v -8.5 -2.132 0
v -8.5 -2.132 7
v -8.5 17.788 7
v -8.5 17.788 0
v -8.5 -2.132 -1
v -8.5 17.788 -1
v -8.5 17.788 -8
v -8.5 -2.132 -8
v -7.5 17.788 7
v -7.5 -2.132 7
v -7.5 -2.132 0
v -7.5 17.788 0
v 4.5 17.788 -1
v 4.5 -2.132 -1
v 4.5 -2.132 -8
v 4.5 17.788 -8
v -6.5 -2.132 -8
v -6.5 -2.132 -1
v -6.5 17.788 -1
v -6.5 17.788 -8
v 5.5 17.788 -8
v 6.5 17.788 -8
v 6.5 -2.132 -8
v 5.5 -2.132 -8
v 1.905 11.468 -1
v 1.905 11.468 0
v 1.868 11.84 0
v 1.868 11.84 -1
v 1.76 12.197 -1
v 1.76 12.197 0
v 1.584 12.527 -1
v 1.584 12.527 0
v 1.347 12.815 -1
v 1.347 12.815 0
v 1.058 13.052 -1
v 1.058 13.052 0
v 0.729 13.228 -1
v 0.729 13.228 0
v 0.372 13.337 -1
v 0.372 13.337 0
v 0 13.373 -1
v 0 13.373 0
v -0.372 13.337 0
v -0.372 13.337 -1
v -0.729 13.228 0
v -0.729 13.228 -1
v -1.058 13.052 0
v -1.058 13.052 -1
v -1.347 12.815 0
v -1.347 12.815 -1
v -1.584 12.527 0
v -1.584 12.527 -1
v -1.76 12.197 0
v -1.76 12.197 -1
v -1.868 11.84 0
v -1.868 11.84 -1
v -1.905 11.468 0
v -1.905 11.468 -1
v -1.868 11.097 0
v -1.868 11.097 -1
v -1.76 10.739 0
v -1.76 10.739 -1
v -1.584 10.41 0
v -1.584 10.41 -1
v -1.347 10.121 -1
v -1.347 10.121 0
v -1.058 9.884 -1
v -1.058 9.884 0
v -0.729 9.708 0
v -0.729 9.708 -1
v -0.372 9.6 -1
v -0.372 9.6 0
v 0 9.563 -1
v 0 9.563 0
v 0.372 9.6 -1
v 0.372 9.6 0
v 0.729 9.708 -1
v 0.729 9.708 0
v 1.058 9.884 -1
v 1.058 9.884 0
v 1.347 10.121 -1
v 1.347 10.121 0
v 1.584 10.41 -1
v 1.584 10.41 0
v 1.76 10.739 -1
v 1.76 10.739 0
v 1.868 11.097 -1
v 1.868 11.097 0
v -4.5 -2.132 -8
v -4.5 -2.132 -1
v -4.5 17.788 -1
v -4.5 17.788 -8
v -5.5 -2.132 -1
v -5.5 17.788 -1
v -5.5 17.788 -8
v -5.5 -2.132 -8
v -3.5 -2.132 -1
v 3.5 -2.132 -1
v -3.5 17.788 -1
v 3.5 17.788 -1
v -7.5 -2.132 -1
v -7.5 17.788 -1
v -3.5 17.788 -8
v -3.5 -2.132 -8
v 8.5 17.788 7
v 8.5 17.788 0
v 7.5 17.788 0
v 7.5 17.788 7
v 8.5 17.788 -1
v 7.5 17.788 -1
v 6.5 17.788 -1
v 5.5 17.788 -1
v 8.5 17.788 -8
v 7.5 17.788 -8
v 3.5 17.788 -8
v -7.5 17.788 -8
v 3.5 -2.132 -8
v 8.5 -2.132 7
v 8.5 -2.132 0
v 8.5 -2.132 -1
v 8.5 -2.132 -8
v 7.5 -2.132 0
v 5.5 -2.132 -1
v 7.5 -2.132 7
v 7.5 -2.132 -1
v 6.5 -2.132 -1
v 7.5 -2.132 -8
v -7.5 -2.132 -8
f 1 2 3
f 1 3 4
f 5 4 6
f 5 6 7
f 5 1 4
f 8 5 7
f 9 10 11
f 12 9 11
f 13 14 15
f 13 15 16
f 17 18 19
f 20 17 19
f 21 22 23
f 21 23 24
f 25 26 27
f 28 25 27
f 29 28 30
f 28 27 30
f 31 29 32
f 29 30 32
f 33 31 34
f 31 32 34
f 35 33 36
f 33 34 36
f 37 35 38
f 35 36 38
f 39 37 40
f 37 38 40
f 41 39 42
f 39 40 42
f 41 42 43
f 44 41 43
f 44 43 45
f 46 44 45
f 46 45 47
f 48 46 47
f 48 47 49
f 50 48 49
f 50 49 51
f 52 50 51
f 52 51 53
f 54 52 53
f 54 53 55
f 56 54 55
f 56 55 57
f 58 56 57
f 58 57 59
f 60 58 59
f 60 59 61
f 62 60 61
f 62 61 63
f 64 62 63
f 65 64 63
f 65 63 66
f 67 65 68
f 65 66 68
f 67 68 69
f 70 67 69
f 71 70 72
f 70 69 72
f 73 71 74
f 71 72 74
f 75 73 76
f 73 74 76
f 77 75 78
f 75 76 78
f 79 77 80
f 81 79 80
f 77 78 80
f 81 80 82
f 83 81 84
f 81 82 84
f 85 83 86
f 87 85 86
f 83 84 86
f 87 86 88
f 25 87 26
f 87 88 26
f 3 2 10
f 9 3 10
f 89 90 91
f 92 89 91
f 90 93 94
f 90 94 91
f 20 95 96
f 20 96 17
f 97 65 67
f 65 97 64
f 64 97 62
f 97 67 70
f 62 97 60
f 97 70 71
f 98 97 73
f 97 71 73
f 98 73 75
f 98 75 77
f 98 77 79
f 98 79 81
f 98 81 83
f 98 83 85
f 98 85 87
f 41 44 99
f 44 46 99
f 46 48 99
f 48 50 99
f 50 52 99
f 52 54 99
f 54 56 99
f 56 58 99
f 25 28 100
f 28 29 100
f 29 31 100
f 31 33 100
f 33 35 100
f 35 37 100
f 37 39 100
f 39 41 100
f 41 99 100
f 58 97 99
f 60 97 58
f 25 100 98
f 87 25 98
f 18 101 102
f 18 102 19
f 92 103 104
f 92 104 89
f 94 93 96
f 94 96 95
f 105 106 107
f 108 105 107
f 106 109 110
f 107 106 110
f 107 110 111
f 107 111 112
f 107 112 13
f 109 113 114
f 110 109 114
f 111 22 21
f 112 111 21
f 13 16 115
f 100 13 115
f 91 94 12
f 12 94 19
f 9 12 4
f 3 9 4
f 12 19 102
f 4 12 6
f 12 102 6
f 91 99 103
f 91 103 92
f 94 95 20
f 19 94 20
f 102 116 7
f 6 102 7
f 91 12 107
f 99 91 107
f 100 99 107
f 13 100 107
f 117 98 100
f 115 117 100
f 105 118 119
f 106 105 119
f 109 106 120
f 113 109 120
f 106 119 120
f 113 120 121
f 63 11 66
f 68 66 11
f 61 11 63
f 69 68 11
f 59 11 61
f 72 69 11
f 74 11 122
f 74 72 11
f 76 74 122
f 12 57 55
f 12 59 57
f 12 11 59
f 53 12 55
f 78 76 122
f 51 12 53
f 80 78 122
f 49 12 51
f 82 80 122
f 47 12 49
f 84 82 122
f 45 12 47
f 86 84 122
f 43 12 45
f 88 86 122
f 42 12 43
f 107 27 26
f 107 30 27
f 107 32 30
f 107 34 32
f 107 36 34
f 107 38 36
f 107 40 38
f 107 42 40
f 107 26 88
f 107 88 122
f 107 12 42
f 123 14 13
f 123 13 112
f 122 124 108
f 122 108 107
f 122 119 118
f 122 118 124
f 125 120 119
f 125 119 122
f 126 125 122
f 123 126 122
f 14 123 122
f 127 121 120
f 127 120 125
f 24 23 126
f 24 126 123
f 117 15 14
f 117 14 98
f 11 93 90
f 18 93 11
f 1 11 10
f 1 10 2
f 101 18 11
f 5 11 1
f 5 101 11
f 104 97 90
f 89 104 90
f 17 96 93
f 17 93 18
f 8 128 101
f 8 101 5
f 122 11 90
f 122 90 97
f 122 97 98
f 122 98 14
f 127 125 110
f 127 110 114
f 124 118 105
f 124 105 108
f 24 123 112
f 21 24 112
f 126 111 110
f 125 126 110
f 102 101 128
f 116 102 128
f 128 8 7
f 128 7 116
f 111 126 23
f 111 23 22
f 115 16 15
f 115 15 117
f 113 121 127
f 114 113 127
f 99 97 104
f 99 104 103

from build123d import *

# Parameters (mm, degrees)
SKETCH11_W              = 17
SKETCH11_H              = 19.920243607
BOSS_EXTRUDE7_DEPTH     = 1
BOSS_EXTRUDE5_START     = -2.131780543
BOSS_EXTRUDE5_OUTLINE_W = 1
BOSS_EXTRUDE5_OUTLINE_H = 7
BOSS_EXTRUDE5_DEPTH     = 19.920243607
SKETCH13_W              = 1
SKETCH13_H              = 19.920243607
BOSS_EXTRUDE6_DEPTH     = 7
LPATTERN3_COUNT         = 7
LPATTERN3_PITCH         = 2
CUT_EXTRUDE1_REACH      = 23.276
SKETCH14_R              = 1.905


# Read off the part's stored shape, not the designer's step: Boss-Extrude5
with BuildPart() as part:
    # Sketch11 (on Front Plane) → Boss-Extrude7 (new body)
    with BuildSketch(Plane.XY):
        with Locations((0, 7.828341261)):
            Rectangle(SKETCH11_W, SKETCH11_H)
    extrude(amount=-BOSS_EXTRUDE7_DEPTH)

    # Boss-Extrude5 outline → Boss-Extrude5 (add)
    with BuildSketch(Plane(origin=(0, 0, 0), x_dir=(1, 0, 0), z_dir=(0, 1, 0)).offset(BOSS_EXTRUDE5_START)):
        with Locations((-8, 4.5)):
            Rectangle(BOSS_EXTRUDE5_OUTLINE_W, BOSS_EXTRUDE5_OUTLINE_H)
        with Locations((-8, -3.5)):
            Rectangle(BOSS_EXTRUDE5_OUTLINE_W, BOSS_EXTRUDE5_OUTLINE_H)
    boss_extrude5 = extrude(amount=BOSS_EXTRUDE5_DEPTH)

    # Mirror1: Boss-Extrude5 across plane
    add(boss_extrude5.mirror(Plane(origin=(0, 0, 0), x_dir=(0, 0, 1), z_dir=(1, 0, 0))))

    # Sketch13 → Boss-Extrude6 (add, through all)
    with BuildSketch(Plane(origin=(0, 0, -1), x_dir=(-1, 0, 0), z_dir=(0, 0, -1))):
        with Locations((6, 7.828341261)):
            Rectangle(SKETCH13_W, SKETCH13_H)
    boss_extrude6 = extrude(amount=BOSS_EXTRUDE6_DEPTH)

    # LPattern3: Boss-Extrude6 ×7, 3 skipped
    with Locations(*[(i * LPATTERN3_PITCH, 0, 0) for i in range(1, LPATTERN3_COUNT) if i not in (2, 3, 4)]):
        add(boss_extrude6)

    # Sketch14 → Cut-Extrude1 (cut, up to next)
    with BuildSketch(Plane.XY, mode=Mode.PRIVATE) as cut_extrude1_sk1:
        with Locations((0, 11.468219457)):
            Circle(SKETCH14_R)
    cut_extrude1_tool1 = extrude(cut_extrude1_sk1.sketch, amount=-CUT_EXTRUDE1_REACH, mode=Mode.PRIVATE) & part.part
    add(cut_extrude1_tool1.solids().sort_by_distance((0, 11.468219, 0))[0], mode=Mode.SUBTRACT)


solid = part.part
